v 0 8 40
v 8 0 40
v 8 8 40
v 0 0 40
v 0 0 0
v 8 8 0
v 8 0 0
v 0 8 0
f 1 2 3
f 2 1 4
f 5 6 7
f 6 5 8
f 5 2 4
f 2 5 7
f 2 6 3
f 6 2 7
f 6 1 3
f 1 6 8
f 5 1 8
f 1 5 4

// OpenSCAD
module remove_cube() {
    cube(size=[8, 8, 40]);
}

// call module when run directly
remove_cube();
